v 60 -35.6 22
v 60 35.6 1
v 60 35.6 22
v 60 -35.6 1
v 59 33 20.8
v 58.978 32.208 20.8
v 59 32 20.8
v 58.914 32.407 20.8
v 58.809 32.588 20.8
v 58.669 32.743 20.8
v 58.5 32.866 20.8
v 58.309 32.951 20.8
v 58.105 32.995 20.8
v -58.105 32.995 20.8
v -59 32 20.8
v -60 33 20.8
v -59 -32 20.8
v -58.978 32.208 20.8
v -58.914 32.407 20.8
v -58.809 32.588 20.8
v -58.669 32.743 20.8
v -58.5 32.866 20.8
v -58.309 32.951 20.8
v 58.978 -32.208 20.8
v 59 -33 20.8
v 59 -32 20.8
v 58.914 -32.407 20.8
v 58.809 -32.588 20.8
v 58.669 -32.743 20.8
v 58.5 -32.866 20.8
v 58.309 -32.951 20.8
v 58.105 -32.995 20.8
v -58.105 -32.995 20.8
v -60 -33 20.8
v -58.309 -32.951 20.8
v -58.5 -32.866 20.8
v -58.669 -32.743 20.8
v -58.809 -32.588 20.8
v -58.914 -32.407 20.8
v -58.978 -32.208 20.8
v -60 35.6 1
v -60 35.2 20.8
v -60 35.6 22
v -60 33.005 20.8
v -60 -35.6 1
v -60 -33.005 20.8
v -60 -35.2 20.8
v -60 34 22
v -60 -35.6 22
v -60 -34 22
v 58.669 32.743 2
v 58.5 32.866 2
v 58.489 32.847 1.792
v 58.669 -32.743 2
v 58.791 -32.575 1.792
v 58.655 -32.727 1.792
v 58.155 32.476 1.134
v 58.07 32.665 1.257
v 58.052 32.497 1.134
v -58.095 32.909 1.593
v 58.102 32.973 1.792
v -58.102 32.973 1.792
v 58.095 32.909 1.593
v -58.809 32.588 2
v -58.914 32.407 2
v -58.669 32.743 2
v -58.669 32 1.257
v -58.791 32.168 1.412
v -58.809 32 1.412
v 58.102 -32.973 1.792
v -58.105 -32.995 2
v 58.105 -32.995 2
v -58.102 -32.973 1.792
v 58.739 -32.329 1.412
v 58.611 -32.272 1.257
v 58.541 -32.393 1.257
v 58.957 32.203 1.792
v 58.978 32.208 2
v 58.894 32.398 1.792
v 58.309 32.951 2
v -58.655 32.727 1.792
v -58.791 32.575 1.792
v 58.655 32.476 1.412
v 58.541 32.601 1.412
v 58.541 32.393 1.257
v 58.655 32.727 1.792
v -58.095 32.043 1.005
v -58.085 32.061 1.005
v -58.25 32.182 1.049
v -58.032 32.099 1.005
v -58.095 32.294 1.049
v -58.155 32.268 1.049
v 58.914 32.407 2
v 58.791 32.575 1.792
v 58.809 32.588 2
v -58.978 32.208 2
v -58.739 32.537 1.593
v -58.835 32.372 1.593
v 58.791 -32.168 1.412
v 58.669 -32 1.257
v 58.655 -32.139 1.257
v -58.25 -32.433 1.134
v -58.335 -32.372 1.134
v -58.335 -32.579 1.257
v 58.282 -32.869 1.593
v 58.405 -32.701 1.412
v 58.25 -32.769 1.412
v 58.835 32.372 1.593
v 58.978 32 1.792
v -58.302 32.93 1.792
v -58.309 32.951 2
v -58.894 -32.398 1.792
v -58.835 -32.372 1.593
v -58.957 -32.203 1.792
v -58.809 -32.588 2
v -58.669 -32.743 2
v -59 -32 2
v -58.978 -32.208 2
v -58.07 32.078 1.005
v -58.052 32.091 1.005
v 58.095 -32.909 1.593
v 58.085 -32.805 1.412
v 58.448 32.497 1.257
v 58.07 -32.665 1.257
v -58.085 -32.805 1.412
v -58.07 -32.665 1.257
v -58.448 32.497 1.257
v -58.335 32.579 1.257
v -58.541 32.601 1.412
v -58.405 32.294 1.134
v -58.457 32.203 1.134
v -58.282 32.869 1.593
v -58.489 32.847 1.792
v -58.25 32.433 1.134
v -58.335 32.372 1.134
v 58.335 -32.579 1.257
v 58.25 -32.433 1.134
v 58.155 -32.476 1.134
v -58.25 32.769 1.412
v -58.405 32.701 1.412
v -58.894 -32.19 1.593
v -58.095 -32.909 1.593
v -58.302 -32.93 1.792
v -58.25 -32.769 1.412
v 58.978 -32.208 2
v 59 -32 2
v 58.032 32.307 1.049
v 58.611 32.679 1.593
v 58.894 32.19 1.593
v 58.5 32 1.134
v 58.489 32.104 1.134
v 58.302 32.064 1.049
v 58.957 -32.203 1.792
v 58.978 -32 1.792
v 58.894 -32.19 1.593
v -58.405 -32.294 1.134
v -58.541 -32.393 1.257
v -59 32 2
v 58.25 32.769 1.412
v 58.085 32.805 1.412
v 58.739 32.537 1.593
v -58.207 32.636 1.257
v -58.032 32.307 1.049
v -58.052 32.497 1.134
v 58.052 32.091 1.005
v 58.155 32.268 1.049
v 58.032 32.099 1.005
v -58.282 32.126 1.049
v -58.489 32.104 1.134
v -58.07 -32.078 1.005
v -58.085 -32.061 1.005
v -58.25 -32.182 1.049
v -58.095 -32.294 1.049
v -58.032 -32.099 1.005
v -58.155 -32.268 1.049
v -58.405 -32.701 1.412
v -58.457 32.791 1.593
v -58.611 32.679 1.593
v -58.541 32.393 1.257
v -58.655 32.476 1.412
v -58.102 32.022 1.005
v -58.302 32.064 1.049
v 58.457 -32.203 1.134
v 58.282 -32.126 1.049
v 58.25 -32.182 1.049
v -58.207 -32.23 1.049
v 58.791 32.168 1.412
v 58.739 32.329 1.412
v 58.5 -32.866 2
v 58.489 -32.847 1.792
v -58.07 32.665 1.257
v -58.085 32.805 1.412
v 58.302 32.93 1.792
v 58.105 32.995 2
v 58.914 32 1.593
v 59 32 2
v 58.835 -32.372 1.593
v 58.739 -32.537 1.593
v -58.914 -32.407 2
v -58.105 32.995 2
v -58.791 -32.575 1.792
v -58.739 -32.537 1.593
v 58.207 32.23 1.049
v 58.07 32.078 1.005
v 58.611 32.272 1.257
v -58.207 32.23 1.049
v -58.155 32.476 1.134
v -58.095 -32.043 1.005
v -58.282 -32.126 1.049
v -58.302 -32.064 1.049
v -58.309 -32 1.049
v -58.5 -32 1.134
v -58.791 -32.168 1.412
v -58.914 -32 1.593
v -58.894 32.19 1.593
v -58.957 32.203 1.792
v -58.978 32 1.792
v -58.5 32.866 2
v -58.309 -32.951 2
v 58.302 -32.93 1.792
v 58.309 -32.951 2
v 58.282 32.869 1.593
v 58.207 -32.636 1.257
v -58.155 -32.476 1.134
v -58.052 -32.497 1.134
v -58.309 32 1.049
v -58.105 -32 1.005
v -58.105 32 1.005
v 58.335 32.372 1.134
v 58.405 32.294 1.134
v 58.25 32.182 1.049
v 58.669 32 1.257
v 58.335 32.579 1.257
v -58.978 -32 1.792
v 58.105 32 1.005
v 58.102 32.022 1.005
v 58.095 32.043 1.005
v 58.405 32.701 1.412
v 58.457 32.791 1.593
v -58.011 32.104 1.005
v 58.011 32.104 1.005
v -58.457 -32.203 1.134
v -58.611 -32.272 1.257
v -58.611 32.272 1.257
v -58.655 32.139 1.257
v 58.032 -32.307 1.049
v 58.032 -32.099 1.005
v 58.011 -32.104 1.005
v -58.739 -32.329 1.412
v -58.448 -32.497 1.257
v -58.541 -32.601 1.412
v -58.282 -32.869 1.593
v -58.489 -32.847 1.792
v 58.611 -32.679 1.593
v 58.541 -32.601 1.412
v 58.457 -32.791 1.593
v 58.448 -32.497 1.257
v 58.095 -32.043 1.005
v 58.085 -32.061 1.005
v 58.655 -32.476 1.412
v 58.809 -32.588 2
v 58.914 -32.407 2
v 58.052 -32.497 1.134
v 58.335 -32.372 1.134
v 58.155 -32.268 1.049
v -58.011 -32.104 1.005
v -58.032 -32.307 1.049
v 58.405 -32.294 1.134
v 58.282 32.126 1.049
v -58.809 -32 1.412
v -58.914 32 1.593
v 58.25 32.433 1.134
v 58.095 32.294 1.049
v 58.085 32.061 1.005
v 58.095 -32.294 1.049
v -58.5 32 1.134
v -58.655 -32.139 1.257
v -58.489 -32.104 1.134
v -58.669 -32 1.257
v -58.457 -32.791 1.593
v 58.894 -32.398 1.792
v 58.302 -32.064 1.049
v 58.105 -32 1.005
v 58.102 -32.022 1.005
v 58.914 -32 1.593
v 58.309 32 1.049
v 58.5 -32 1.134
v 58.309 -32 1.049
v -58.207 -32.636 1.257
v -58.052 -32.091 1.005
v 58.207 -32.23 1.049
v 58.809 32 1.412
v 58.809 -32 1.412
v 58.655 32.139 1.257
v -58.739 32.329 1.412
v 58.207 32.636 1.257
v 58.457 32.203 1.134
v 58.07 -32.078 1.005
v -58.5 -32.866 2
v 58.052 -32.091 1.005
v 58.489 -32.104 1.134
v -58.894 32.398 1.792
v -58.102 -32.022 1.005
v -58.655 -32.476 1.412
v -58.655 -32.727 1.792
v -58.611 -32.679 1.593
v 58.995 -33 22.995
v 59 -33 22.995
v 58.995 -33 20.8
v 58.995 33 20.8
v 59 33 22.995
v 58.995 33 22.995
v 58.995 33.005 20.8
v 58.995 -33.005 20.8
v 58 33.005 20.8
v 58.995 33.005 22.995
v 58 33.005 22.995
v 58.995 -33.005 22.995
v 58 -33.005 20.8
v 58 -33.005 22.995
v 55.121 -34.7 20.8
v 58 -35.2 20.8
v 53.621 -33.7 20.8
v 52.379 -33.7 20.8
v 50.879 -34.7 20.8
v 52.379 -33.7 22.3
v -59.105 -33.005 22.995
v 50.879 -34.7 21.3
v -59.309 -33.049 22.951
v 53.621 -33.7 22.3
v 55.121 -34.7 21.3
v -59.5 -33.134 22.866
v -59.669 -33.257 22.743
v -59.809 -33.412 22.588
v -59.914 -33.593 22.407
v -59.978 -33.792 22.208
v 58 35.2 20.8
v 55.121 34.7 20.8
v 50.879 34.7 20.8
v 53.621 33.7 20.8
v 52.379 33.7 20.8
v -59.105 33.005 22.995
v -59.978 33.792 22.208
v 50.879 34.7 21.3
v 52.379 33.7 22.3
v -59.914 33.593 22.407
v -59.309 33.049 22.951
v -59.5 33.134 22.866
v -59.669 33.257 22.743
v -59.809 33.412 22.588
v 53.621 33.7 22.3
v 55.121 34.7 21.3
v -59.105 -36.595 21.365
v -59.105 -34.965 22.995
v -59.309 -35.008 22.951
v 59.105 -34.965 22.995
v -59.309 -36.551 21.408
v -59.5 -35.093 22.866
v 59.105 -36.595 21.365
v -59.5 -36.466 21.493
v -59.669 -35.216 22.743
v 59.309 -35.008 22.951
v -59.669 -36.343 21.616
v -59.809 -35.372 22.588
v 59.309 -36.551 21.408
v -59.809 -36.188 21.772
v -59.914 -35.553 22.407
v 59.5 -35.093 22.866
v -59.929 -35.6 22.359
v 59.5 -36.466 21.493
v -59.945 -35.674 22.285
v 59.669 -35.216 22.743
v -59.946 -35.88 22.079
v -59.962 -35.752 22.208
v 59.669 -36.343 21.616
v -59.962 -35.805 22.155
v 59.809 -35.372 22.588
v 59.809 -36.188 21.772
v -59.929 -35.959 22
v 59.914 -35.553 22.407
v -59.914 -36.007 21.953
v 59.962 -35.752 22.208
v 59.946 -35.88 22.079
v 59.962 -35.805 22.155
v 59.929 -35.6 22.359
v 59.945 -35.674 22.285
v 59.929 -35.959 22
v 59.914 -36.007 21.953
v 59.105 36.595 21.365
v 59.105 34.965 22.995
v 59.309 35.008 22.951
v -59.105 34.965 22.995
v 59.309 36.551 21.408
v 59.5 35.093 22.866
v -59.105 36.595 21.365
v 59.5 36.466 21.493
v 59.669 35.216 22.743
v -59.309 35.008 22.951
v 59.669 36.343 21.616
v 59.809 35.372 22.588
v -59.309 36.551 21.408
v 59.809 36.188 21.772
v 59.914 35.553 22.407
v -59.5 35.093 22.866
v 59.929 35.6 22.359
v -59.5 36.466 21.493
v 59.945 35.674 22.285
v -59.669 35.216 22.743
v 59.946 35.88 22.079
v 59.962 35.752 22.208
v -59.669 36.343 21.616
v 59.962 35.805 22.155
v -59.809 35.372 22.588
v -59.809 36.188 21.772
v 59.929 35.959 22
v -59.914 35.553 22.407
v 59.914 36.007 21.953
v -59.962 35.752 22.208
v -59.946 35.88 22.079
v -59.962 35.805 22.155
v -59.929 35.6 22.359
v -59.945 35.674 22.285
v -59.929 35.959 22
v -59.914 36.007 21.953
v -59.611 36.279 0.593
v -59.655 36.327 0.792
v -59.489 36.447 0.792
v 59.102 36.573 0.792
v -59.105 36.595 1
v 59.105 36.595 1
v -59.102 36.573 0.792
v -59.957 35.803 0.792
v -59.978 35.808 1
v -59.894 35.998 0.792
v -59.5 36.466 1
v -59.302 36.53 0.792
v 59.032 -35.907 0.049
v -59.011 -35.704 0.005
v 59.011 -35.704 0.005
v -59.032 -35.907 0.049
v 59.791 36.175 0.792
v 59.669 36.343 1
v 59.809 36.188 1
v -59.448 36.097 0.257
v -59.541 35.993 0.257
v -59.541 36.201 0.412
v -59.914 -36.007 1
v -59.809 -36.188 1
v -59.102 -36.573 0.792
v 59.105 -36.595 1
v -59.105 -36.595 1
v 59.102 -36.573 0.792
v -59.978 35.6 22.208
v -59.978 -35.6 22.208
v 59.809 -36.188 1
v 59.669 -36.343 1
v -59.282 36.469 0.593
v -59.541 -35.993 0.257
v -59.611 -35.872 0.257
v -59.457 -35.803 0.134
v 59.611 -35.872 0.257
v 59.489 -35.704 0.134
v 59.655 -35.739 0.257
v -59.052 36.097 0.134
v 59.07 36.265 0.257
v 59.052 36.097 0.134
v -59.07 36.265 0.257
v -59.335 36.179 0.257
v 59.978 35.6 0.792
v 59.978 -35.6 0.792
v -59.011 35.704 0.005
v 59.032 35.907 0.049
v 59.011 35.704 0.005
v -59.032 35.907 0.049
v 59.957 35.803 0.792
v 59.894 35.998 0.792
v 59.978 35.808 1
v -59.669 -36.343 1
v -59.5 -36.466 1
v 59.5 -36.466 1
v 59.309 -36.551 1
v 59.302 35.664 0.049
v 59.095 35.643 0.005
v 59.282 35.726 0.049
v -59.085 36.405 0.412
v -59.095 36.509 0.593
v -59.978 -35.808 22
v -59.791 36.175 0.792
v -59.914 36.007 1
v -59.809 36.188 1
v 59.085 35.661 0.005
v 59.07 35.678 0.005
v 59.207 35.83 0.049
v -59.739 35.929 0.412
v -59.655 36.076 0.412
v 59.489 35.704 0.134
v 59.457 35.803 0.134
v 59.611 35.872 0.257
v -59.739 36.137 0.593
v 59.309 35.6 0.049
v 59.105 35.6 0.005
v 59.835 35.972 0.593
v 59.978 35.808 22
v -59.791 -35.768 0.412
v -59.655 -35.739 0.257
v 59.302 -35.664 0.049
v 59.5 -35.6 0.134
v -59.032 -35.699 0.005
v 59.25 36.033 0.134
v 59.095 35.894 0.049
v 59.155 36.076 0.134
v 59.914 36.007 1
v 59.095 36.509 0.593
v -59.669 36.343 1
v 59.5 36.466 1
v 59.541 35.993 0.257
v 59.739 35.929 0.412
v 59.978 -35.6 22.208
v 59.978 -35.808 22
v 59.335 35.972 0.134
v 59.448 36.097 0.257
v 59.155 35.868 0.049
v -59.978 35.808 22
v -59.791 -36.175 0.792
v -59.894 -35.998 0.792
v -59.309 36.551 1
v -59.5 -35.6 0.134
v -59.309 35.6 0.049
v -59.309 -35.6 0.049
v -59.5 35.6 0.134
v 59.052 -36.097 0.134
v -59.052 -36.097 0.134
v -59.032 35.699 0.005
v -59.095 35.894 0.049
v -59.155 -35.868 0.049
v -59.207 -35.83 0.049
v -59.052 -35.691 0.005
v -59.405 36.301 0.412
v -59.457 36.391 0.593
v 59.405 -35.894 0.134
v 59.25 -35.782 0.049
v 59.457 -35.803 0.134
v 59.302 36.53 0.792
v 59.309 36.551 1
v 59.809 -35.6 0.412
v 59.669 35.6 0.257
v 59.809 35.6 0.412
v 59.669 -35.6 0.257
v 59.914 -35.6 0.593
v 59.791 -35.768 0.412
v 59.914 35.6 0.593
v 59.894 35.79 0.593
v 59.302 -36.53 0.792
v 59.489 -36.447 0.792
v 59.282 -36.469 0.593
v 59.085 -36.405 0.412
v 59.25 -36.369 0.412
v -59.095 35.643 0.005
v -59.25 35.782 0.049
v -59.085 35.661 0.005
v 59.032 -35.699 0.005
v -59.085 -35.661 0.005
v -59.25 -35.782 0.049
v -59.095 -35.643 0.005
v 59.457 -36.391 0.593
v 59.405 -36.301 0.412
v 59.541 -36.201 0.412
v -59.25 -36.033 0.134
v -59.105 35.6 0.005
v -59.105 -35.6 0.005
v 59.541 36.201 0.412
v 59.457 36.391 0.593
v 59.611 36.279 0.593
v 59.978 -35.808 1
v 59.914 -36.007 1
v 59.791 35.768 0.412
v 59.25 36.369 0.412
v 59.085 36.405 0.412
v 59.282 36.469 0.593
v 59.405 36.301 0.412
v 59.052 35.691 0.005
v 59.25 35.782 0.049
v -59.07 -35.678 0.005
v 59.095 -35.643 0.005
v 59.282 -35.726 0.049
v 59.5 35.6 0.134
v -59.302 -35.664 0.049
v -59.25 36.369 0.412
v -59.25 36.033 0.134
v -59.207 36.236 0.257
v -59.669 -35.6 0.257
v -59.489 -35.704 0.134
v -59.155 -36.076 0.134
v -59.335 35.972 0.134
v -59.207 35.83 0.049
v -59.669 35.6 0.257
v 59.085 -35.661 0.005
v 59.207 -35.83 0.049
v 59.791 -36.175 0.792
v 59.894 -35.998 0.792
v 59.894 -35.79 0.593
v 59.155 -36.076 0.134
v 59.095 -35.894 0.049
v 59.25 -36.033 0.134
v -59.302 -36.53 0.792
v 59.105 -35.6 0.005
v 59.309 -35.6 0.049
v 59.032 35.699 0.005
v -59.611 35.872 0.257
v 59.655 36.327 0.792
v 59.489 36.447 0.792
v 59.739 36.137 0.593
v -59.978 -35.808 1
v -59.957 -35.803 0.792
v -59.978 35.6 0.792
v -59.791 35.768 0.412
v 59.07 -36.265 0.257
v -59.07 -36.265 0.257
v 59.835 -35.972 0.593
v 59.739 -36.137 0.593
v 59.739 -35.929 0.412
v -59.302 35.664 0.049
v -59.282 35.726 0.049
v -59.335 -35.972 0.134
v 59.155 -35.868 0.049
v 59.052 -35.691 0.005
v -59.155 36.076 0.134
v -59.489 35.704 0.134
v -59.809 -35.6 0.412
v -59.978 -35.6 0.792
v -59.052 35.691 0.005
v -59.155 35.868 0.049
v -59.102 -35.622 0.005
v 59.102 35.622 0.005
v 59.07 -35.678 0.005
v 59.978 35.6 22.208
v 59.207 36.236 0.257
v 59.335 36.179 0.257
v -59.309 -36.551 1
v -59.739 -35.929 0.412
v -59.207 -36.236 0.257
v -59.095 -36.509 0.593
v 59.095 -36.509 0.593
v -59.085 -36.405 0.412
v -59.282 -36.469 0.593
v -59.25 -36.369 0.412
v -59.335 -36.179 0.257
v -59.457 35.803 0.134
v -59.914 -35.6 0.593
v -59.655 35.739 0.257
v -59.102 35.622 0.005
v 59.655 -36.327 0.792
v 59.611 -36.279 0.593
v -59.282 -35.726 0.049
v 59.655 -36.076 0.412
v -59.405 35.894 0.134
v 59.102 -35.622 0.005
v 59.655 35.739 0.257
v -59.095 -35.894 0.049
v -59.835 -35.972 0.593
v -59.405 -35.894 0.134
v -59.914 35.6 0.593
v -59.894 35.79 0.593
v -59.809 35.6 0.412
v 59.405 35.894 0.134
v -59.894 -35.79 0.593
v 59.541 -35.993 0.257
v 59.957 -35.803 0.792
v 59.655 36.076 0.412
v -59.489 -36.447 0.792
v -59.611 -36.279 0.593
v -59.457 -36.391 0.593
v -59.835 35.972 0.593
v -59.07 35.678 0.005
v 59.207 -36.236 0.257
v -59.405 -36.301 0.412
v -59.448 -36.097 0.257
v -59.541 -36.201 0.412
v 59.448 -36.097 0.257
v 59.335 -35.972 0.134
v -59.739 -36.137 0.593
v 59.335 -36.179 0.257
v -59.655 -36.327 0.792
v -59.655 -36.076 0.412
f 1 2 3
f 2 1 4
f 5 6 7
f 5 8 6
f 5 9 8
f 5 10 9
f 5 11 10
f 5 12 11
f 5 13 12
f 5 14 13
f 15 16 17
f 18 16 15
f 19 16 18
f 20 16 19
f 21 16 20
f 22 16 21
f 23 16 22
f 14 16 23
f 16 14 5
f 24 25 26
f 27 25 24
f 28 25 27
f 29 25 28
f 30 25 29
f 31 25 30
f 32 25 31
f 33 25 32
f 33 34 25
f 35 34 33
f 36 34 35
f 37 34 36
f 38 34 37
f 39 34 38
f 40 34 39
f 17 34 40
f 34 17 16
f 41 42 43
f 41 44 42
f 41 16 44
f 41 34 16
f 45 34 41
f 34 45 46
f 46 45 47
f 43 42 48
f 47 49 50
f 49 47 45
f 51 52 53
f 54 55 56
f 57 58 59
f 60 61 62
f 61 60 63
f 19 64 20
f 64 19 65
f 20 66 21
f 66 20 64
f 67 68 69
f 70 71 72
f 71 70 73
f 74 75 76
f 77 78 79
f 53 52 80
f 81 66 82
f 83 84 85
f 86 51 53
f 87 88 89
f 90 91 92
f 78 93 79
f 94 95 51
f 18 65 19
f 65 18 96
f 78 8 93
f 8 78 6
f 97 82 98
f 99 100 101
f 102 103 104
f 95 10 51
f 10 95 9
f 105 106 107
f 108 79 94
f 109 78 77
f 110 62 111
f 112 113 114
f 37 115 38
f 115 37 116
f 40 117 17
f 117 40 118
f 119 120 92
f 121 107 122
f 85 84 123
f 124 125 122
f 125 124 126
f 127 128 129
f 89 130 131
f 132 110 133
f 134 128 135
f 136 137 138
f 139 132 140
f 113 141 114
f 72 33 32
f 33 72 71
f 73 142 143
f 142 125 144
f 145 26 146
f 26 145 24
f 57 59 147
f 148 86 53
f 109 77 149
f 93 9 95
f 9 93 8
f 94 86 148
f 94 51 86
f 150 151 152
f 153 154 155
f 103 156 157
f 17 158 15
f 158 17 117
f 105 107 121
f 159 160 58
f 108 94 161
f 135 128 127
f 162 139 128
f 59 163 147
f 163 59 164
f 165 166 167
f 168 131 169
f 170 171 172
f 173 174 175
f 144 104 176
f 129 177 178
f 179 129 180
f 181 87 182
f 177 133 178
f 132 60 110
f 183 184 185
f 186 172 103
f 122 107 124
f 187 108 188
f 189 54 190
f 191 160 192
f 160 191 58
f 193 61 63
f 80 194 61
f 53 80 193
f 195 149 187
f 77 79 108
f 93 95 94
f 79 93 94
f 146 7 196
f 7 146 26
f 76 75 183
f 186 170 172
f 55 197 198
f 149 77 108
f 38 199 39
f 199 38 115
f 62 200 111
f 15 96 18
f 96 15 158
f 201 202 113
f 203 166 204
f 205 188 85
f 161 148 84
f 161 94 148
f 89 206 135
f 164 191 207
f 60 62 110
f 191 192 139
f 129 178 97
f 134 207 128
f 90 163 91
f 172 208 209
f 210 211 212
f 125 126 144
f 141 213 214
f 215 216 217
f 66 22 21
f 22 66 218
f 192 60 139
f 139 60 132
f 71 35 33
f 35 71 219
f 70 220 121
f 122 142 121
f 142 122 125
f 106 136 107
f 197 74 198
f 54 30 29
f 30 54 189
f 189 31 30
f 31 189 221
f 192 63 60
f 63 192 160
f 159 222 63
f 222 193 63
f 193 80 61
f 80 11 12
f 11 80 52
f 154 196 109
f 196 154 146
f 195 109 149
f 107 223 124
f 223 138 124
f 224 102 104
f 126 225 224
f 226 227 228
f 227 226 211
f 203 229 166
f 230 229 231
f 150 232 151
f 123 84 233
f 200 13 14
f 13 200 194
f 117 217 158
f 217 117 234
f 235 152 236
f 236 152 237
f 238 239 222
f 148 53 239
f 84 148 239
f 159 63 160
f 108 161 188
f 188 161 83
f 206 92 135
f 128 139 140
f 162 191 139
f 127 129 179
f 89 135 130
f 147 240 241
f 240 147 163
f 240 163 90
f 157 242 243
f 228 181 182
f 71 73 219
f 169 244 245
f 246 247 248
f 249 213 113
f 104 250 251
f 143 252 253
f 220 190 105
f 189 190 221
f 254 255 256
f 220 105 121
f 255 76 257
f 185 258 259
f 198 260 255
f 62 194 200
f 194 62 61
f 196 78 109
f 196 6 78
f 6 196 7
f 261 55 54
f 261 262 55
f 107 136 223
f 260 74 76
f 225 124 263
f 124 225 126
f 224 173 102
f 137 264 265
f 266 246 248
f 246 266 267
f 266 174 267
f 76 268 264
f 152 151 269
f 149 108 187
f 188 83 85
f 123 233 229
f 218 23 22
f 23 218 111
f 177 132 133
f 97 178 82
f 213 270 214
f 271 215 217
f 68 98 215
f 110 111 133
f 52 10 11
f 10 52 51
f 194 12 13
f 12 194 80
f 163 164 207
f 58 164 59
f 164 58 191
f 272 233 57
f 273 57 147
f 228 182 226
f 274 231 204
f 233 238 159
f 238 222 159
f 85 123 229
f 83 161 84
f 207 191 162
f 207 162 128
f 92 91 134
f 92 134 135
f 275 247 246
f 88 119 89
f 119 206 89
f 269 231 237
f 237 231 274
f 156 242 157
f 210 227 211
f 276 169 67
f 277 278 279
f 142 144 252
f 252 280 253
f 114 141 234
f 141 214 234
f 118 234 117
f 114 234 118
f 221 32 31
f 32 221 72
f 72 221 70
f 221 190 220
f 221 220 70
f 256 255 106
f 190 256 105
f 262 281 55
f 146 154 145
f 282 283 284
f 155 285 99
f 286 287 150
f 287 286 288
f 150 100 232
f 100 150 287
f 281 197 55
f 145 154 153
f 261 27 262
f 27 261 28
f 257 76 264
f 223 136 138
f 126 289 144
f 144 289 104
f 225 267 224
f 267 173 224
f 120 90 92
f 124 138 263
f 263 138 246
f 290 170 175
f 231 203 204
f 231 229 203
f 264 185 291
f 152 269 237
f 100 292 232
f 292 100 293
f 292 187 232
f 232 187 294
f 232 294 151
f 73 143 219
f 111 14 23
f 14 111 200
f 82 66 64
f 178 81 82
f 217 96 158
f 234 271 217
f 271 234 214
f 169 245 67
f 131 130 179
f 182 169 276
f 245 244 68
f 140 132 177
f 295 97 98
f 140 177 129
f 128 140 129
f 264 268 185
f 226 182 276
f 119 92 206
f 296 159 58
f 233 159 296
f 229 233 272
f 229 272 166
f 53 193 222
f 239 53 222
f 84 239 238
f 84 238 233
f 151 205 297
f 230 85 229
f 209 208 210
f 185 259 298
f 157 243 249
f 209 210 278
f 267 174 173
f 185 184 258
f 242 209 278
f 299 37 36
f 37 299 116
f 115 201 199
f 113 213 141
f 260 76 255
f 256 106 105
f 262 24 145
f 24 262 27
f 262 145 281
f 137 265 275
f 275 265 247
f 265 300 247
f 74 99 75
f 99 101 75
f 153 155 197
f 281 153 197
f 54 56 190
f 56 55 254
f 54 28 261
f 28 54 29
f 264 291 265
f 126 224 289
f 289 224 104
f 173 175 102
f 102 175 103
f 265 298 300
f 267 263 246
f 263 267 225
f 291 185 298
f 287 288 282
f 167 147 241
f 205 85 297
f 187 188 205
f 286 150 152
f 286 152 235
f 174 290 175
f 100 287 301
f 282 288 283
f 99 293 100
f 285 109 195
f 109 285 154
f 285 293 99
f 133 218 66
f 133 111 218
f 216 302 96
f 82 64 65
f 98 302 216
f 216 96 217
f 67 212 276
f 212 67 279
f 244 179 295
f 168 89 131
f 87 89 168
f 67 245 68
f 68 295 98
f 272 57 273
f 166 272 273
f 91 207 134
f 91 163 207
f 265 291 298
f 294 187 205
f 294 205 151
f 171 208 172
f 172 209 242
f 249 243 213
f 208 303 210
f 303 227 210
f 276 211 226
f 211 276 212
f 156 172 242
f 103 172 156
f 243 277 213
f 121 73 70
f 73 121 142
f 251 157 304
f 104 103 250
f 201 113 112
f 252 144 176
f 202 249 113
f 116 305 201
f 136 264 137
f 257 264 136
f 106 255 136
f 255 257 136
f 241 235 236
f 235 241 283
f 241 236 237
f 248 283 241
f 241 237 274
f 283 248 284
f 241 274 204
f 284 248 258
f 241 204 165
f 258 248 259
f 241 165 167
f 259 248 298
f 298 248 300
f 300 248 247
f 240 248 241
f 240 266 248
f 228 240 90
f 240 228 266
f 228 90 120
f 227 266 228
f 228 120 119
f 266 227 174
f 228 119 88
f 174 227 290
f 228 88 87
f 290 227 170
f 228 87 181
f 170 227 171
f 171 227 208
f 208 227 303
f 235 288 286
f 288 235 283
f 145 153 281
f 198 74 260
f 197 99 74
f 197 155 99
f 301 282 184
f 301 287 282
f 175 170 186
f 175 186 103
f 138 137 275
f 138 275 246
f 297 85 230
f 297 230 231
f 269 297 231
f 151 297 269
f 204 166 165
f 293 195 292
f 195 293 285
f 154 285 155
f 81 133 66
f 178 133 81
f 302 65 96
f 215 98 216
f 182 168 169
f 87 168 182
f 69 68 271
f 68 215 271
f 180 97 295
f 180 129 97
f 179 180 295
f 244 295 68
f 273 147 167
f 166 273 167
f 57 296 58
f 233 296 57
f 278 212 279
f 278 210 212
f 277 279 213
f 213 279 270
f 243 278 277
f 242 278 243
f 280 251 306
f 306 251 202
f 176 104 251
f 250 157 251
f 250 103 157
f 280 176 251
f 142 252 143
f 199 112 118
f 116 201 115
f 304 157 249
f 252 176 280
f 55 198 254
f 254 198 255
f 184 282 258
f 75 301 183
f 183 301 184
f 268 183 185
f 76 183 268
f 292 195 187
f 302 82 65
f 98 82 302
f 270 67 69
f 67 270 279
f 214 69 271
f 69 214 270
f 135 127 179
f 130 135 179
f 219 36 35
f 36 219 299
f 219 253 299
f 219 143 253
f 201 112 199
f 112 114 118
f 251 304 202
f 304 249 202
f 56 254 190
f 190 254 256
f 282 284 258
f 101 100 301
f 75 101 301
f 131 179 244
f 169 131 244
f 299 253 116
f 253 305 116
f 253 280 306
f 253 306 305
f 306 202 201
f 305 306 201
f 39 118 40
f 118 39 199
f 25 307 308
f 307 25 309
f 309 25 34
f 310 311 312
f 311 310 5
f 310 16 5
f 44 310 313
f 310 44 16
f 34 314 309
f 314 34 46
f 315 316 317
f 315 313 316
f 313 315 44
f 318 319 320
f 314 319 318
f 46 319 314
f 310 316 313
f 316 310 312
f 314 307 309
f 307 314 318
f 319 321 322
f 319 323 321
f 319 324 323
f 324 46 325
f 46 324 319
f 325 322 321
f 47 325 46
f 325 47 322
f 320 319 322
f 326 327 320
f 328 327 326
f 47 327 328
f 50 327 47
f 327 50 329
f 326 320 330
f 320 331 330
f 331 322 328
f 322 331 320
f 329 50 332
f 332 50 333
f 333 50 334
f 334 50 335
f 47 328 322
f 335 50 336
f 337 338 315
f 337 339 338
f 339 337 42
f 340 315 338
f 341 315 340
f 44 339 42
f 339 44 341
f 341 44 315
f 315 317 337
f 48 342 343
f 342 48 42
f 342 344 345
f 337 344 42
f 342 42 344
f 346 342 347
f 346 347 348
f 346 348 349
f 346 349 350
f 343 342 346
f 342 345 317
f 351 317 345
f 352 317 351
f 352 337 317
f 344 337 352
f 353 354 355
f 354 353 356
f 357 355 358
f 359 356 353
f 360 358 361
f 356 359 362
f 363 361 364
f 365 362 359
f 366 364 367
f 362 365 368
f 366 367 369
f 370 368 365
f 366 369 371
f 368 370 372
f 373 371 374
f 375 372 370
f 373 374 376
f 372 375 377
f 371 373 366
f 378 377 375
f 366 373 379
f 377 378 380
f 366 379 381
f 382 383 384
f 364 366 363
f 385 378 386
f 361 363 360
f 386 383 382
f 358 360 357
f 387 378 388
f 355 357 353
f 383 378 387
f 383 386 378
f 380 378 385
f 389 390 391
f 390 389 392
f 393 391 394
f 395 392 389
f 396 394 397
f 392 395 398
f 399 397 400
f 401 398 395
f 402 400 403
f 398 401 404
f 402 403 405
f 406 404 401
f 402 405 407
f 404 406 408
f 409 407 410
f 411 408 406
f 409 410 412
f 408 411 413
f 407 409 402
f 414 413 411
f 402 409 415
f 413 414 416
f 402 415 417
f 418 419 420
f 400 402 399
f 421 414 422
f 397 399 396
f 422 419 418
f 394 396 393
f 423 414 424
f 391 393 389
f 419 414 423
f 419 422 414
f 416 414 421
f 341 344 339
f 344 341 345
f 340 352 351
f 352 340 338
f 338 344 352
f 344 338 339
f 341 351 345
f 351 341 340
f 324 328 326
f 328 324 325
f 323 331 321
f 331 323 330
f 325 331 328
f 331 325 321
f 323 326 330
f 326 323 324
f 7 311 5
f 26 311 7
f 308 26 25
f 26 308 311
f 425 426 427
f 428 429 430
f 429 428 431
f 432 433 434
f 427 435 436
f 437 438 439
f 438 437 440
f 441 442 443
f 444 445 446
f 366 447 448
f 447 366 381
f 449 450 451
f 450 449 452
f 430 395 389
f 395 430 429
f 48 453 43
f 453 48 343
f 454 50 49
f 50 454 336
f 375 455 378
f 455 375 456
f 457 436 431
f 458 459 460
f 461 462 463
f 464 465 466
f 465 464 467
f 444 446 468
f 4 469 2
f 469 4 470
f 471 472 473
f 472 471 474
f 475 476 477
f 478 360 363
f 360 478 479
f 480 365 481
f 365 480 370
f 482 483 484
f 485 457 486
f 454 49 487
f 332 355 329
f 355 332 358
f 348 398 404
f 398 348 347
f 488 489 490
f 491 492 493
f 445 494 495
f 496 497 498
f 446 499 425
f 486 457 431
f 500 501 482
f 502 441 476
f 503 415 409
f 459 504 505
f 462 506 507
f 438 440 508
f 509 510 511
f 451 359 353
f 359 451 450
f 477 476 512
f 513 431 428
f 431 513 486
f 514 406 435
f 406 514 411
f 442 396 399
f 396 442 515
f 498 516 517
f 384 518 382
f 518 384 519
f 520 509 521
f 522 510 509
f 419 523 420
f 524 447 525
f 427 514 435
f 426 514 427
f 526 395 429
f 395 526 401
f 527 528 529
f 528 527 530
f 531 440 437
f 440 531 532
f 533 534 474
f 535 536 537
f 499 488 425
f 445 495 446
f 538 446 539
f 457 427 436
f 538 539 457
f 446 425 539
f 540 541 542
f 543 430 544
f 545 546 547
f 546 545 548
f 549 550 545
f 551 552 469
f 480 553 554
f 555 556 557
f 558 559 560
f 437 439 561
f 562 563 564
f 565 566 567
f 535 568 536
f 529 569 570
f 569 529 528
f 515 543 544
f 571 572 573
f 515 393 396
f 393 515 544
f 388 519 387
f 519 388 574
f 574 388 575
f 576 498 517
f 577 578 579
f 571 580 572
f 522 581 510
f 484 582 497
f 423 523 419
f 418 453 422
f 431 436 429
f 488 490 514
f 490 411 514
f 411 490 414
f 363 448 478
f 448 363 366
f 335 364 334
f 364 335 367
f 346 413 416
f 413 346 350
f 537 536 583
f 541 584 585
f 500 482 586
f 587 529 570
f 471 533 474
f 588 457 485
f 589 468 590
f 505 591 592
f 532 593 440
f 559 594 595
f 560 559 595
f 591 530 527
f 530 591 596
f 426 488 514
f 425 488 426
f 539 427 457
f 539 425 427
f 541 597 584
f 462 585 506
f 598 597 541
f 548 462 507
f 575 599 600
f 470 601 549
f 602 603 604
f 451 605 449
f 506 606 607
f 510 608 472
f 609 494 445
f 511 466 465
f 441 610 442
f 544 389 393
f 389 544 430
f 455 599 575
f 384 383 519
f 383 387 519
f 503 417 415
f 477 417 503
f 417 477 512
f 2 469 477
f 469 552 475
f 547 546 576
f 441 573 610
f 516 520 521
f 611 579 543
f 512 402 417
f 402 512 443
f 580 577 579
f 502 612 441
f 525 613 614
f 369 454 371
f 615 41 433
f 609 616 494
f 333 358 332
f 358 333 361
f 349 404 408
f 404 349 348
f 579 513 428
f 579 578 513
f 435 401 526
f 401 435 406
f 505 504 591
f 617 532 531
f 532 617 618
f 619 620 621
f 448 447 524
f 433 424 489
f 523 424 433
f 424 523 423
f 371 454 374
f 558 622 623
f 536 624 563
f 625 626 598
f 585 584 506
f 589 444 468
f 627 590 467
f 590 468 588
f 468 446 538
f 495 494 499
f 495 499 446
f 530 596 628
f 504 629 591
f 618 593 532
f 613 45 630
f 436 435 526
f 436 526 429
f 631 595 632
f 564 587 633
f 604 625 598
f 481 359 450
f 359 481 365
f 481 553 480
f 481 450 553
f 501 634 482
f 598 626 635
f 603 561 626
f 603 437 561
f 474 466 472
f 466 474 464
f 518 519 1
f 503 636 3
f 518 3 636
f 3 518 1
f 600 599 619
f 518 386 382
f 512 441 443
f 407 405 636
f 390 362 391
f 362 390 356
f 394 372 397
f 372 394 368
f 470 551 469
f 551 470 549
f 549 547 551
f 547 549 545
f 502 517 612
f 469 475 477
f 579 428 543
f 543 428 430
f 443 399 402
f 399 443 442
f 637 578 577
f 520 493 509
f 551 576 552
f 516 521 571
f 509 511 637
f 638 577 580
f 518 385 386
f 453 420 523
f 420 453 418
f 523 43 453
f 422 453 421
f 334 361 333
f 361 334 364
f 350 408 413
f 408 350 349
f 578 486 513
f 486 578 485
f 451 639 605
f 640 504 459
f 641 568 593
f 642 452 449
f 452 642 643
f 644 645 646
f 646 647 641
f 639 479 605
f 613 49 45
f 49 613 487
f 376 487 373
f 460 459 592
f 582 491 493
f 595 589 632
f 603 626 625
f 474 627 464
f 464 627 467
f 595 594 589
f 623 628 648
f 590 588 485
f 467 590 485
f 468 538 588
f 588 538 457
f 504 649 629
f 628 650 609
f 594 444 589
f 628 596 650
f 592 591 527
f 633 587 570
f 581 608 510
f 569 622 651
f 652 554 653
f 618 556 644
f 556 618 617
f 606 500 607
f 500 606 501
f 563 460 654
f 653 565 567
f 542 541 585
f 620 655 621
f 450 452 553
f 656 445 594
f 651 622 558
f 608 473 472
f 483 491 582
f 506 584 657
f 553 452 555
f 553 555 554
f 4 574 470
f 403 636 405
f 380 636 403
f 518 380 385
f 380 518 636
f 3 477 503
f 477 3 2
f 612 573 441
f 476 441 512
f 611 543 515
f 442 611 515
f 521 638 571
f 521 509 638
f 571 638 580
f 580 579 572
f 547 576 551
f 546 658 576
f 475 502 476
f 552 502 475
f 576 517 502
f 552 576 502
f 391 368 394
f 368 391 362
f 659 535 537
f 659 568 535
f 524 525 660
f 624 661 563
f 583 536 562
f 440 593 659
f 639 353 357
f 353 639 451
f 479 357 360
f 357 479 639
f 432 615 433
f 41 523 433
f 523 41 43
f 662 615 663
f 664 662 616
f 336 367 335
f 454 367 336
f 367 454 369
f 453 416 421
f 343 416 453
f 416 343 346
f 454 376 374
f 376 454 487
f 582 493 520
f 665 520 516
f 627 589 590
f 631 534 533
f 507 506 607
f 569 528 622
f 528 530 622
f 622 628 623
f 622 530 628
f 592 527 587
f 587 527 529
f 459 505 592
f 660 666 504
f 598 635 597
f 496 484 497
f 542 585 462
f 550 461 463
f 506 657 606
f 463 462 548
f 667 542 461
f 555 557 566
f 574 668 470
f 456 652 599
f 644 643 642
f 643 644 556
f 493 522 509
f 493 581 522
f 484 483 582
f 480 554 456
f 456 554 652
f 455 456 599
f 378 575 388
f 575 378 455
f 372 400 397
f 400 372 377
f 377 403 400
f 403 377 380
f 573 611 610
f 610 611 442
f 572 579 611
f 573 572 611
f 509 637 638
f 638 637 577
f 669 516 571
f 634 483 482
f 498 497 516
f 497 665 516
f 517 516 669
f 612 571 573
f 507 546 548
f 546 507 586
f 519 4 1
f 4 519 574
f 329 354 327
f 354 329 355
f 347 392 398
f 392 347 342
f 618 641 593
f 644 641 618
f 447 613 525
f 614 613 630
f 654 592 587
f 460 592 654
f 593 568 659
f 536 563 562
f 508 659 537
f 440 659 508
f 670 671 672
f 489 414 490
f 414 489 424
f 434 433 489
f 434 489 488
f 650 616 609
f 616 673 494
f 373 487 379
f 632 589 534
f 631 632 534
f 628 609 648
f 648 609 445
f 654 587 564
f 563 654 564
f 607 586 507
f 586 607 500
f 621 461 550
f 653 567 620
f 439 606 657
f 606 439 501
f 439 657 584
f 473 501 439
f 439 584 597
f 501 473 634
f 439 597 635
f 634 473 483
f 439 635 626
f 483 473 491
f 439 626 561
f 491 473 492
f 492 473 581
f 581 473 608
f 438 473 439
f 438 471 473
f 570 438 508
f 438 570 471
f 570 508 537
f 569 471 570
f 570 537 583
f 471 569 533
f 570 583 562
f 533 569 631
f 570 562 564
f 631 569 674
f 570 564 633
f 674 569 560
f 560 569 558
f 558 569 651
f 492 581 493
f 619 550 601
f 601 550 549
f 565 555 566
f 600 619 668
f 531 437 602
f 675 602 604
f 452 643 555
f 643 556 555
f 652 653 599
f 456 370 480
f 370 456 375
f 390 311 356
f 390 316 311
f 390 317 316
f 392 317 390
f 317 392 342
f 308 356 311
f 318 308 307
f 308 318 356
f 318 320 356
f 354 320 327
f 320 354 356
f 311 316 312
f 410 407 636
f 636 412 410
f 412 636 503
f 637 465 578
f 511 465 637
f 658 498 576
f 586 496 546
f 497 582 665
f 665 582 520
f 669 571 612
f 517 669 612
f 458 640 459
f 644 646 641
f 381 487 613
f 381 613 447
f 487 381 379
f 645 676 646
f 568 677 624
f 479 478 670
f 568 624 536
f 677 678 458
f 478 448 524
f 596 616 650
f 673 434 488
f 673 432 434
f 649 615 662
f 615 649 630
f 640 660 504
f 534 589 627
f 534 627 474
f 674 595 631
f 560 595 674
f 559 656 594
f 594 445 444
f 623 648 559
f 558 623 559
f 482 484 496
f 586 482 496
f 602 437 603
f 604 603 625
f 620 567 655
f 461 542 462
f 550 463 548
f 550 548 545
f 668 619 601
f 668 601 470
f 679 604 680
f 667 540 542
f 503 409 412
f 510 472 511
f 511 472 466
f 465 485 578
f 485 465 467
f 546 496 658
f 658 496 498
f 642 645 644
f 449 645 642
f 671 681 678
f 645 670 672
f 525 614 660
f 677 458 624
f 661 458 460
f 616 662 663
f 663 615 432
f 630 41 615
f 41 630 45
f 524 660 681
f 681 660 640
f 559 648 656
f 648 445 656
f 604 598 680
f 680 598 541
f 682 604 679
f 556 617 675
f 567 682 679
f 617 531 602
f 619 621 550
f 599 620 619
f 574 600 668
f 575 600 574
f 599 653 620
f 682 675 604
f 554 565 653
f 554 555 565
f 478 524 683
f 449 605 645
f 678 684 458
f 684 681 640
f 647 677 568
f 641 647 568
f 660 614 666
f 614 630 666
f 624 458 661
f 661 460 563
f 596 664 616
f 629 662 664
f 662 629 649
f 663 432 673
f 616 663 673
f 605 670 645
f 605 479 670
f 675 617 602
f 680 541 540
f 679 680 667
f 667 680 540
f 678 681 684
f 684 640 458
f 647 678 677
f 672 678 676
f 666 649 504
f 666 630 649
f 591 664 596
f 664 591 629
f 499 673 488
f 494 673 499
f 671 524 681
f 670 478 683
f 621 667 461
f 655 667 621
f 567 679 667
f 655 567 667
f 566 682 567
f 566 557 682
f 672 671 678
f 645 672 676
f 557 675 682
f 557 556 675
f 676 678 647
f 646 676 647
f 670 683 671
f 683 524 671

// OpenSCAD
$fn=30;

/* [Global] */

// Render
Objects = "Box"; //  [Both, Box, Lid]

// use the following syntax to add 1 or more internal x compartment lengths (mm)
x_sizes = [118];
// use the following syntax to add 1 or more internal y compartment widths (mm)
y_sizes = [66];
// Total height including Lid
z_size = 23;

// Type of lid pattern
gPattern = "Fancy"; //  [Hex, Diamond, Web, Solid, Fancy]
// Tolerance
gTol = 0.3;
// Wall Thickness
gWT = 1;
// Curvature bottom
ipR = 1;

/* [Spider Web] */
// Amount of space from one ring or webs to the next
WebSpacing = 5;
// How many rings of webs, best of more than needed
WebStrands = 20;
// Thickness of the strands
WedThickness = 1.8;
// How many segments of web
WebWedges = 12;


/* [Hidden] */
/* Private variables */

// Box Height
TotalZ = z_size;
LidH = 2.2;
RailThick = 1.4;
RailWidth = LidH + RailThick;

function SumList(list, start, end) = (start == end) ? 0 : list[start] + SumList(list, start+1, end);
// Box Length
TotalX = SumList(x_sizes,0,len(x_sizes)) + gWT*(len(x_sizes)+1);
// Box Width 
TotalY = SumList(y_sizes,0,len(y_sizes)) + RailWidth*2 + gWT*(len(y_sizes)-1);

echo("Size: ",TotalX,TotalY);
   
// Height not counting the lid
AdjBoxHeight = TotalZ - LidH;

 module regular_polygon(order, r=1){
 	angles=[ for (i = [0:order-1]) i*(360/order) ];
 	coords=[ for (th=angles) [r*cos(th), r*sin(th)] ];
 	polygon(coords);
 }

module circle_lattice(ipX, ipY, Spacing=10, Walls=1.2)  {


   intersection() {
      square([ipX,ipY]); 
      union() {
	    for (x=[-Spacing:Spacing:ipX+Spacing]) {
           for (y=[-Spacing:Spacing:ipY+Spacing]){
	          difference()  {
			     translate([x+Spacing/2, y+Spacing/2]) circle(r=Spacing*0.75);
			     translate([x+Spacing/2, y+Spacing/2]) circle(r=(Spacing*0.75)-Walls);
		      }
           }   // end for y        
	    }  // end for x
      } // End union
   }
}


module diamond_lattice(ipX, ipY, DSize, WSize)  {

    lOffset = DSize + WSize;

	difference()  {
		square([ipX, ipY]);
		for (x=[0:lOffset:ipX]) {
            for (y=[0:lOffset:ipY]){
  			   translate([x, y])  regular_polygon(4, r=DSize/2);
			   translate([x+lOffset/2, y+lOffset/2]) regular_polygon(4, r=DSize/2);
		    }
        }        
	}
}

module hex_lattice(ipX, ipY, DSize, WSize)  {
    lXOffset = DSize + WSize;
    lYOffset = (DSize+WSize)/cos(30) * 1.5;

	difference()  {
		square([ipX, ipY]);
		for (x=[0:lXOffset:ipX]) {
            for (y=[0:lYOffset:ipY]){
  			   translate([x, y]) rotate([0,0,30]) regular_polygon(6, r=DSize/cos(30)/2);
			   translate([x+lXOffset/2, y+lYOffset/2]) rotate([0,0,30]) regular_polygon(6, r=DSize/cos(30)/2);
		    }
        }  
	}
}

// Make a star with X points
module star(radius, wedges)
{
	angle = 360 / wedges;
	difference() {
		circle(radius, $fn = wedges);
		for(i = [0:wedges - 1]) {
			rotate(angle / 2 + angle * i) translate([radius, 0, 0]) 
			    scale([0.8, 1, 1]) 
				    circle(radius * sin(angle / 2), $fn = 24);
		}
	}
}

module spider_web(ipWebSpacing, strands, ipThickness, wedges) 
{
	for(i = [0:strands - 1]) 
    {
        difference() {
            star(ipWebSpacing * i, wedges);
            offset(r = -ipThickness) star(ipWebSpacing * i, wedges);
        }
	}

	angle = 360 / wedges;
	for(i = [0:wedges - 1])
    {
		rotate(angle * i) translate([0, -ipThickness / 2, 0]) 
			square([ipWebSpacing * strands, ipThickness]);
	}    
}


module RCube(x,y,z,ipR=ipR) {
    translate([-x/2,-y/2,0]) hull(){
      translate([ipR,ipR,ipR]) sphere(ipR);
      translate([x-ipR,ipR,ipR]) sphere(ipR);
      translate([ipR,y-ipR,ipR]) sphere(ipR);
      translate([x-ipR,y-ipR,ipR]) sphere(ipR);
      translate([ipR,ipR,z-ipR]) sphere(ipR);
      translate([x-ipR,ipR,z-ipR]) sphere(ipR);
      translate([ipR,y-ipR,z-ipR]) sphere(ipR);
      translate([x-ipR,y-ipR,z-ipR]) sphere(ipR);
      }  
} 


module lid(ipPattern = "Hex", ipTol = 0.3){
  lAdjX = TotalX;
  lAdjY = TotalY-RailWidth*2-ipTol*2;  
  lAdjZ = LidH;
  CutX = lAdjX - 8;
  CutY = lAdjY - 8;
  lFingerX = 15;
  lFingerY = 16;  

  // main square with center removed for a pattern. 0.01 addition is a kludge to avoid a 2d surface remainging when substracting the lid from the box.
         difference() {
      translate([0,0,lAdjZ/2]) cube([lAdjX+0.01, lAdjY+0.01 , lAdjZ], center=true);

      translate([0,0,lAdjZ/2]) cube([CutX, CutY, lAdjZ], center = true);
      translate([TotalX/2-gWT/2,0,LidH/2])cube([gWT+0.01,TotalY-RailWidth,LidH],center=true);

     // make a slot for the latch can flex         
     translate([TotalX/2,TotalY/2-RailWidth-1.4,-1]) RCube(18,0.8,4,0.4);
     translate([TotalX/2,-TotalY/2+RailWidth+1.4,-1]) RCube(18,0.8,4,0.4);
  }
  
  // The Side triangles
  difference() {
    intersection () {
      union () {
          translate([-lAdjX/2,-lAdjY/2-LidH,LidH]) rotate([0,90,0]) linear_extrude(TotalX-2) polygon([[LidH,0],[LidH,LidH],[0,LidH]], paths=[[0,1,2]]);
          translate([-lAdjX/2,lAdjY/2,LidH]) rotate([0,90,0]) linear_extrude(TotalX-2) polygon([[0,0],[LidH,0],[LidH,LidH]], paths=[[0,1,2]]);
      }
      
      // check if this is real lid (ipTol>0) or negative lid (iptol = 0)
      // if real lid remove center for pattern and remove latches
      if (ipTol>0) 
         {cube([lAdjX, lAdjY + 2*LidH-0.2, lAdjZ*2], center=true);}
    }
       
    if (ipTol>0)
    {
        // cut out slots for the latch 
        translate([TotalX/2-7,lAdjY/2+RailWidth/2+ipTol,LidH/2]) scale([1.5,1,1]) rotate([0,0,45]) cube ([2+ipTol,2+ipTol,LidH+1],center=true);
          
        translate([TotalX/2-7,-lAdjY/2-RailWidth/2-ipTol,LidH/2]) scale([1.5,1,1]) rotate([0,0,45]) cube ([2+ipTol,2+ipTol,LidH+1],center=true);
  
        // trip the rail to ease going past the nub
        translate([TotalX/2,TotalY/2-LidH/2-ipTol,0]) cube([12,LidH,LidH*2],center=true); 
        translate([TotalX/2,-TotalY/2+LidH/2+ipTol,0]) cube([12,LidH,LidH*2],center=true); 
    }
    
  }
 
  // Finger slot
  difference () {
      translate([-CutX/2,-lFingerY/2,0]) cube([lFingerX, lFingerY, lAdjZ]); 
      translate([-CutX/2+lFingerX/2,0,20+LidH/2])sphere(20);     
  }


  // Solid top
  if (ipPattern == "Solid") 
      {   
       difference (){ 
         translate([-CutX/2,-CutY/2,0]) cube([CutX, CutY,   lAdjZ]);
         translate([-CutX/2,-lFingerY/2,0]) cube([lFingerX, lFingerY, lAdjZ]); 
      }
    }
    

  // Spiderweb top
  if (ipPattern == "Web") 
    {
       difference (){ 
         intersection () 
        {    
             linear_extrude(height = lAdjZ) spider_web(WebSpacing, WebStrands, WedThickness, WebWedges);  
              translate([-CutX/2,-CutY/2,0]) cube([CutX, CutY, LidH*2]); 
        }
         translate([-CutX/2,-lFingerY/2,0]) cube([lFingerX, lFingerY, lAdjZ]); 
      }
    }

  // Hex top
  if (ipPattern == "Hex") 
    {   
       difference (){ 
         translate([-CutX/2,-CutY/2,0]) linear_extrude(height = lAdjZ) hex_lattice(CutX,CutY,6,2);
         translate([-CutX/2,-lFingerY/2,0]) cube([lFingerX, lFingerY, lAdjZ]); 
      }
    }

  // Diamond top
  if (ipPattern == "Diamond") 
    {
      difference (){ 
        translate([-CutX/2,-CutY/2,0]) linear_extrude(height = lAdjZ) diamond_lattice(CutX,CutY,7,2);
        translate([-CutX/2,-lFingerY/2,0]) cube([lFingerX, lFingerY, lAdjZ]); 
      }
    }

  // fancy top
  if (ipPattern == "Fancy") 
    {
        echo(CutX,CutY);
      difference (){ 
        translate([-CutX/2,-CutY/2,0]) linear_extrude(height = lAdjZ) circle_lattice(CutX,CutY);
        translate([-CutX/2,-lFingerY/2,0]) cube([lFingerX, lFingerY, lAdjZ]); 
      }
    }

}


module box () {
//  Main Box
  difference() {    
    translate ([0,0,AdjBoxHeight/2]) cube([TotalX,TotalY,AdjBoxHeight], center = true);

    // Scope out compartment areas
    for(nX=[0:len(x_sizes)-1])
    {
      for(nY=[0:len(y_sizes)-1])
      {
         xOffset = SumList(x_sizes,0,nX) + gWT*(nX+1) + x_sizes[nX]/2 - TotalX/2;
         yOffset = SumList(y_sizes,0,nY) + RailWidth + gWT*nY + y_sizes[nY]/2 - TotalY/2;
          
         translate([xOffset,yOffset,gWT]) RCube(x_sizes[nX], y_sizes[nY] ,AdjBoxHeight+20);
      }
    }
  }

  // top rails
  difference() {
      union() {
          translate([0,-TotalY/2+RailWidth/2,AdjBoxHeight+LidH/2]) cube([TotalX,RailWidth,LidH],center = true);  
          translate([0,TotalY/2-RailWidth/2,AdjBoxHeight+LidH/2]) cube([TotalX,RailWidth,LidH],center = true);
           }
       
      // Trim each rail top to a 45 degree angle     
      translate([0,-TotalY/2,AdjBoxHeight+RailWidth]) rotate([45,0,0]) cube([TotalX,RailWidth+0.7,RailWidth+0.7], center=true); 
      translate([0,TotalY/2,AdjBoxHeight+RailWidth])  rotate([45,0,0]) cube([TotalX,RailWidth+0.7,RailWidth+0.7], center=true);  

      // Substract the lid from the rails
      translate([0,0,AdjBoxHeight]) lid(ipPattern = "Solid",ipTol =0);      
  }  
  
   // add backstop
   translate([TotalX/2-1/2,0,TotalZ-LidH/2])cube([1,TotalY-RailWidth,LidH],center=true);
  
  // create the latches 
    translate([TotalX/2-7,TotalY/2-0.1-RailWidth/2,TotalZ-LidH/2]) scale([1.5,1,1]) difference(){
      rotate([0,0,45]) cube ([2,2,LidH+1],center=true);
      translate([0,2,0]) cube ([4,4,LidH+2],center=true);
      translate([0,-2,0])cube([2,2,LidH+2], center=true);
      }  
    translate([TotalX/2-7,-TotalY/2+0.1+RailWidth/2,TotalZ-LidH/2]) scale([1.5,1,1]) difference(){
      rotate([0,0,45]) cube ([2,2,LidH+1],center=true);
      translate([0,-2,0]) cube ([4,4,LidH+2],center=true);
      translate([0,2,0])cube([2,2,LidH+2], center=true);
      }

  
} 

// Production Box
if ((Objects == "Both") || (Objects == "Box")){
  intersection() {
     box();
     RCube(TotalX,TotalY,TotalZ,1);
  }
}

// Production Lid
if ((Objects == "Both")  || (Objects == "Lid")){
  translate([-TotalX - 10,0,0]) lid(ipPattern = gPattern, ipTol = gTol);
}
